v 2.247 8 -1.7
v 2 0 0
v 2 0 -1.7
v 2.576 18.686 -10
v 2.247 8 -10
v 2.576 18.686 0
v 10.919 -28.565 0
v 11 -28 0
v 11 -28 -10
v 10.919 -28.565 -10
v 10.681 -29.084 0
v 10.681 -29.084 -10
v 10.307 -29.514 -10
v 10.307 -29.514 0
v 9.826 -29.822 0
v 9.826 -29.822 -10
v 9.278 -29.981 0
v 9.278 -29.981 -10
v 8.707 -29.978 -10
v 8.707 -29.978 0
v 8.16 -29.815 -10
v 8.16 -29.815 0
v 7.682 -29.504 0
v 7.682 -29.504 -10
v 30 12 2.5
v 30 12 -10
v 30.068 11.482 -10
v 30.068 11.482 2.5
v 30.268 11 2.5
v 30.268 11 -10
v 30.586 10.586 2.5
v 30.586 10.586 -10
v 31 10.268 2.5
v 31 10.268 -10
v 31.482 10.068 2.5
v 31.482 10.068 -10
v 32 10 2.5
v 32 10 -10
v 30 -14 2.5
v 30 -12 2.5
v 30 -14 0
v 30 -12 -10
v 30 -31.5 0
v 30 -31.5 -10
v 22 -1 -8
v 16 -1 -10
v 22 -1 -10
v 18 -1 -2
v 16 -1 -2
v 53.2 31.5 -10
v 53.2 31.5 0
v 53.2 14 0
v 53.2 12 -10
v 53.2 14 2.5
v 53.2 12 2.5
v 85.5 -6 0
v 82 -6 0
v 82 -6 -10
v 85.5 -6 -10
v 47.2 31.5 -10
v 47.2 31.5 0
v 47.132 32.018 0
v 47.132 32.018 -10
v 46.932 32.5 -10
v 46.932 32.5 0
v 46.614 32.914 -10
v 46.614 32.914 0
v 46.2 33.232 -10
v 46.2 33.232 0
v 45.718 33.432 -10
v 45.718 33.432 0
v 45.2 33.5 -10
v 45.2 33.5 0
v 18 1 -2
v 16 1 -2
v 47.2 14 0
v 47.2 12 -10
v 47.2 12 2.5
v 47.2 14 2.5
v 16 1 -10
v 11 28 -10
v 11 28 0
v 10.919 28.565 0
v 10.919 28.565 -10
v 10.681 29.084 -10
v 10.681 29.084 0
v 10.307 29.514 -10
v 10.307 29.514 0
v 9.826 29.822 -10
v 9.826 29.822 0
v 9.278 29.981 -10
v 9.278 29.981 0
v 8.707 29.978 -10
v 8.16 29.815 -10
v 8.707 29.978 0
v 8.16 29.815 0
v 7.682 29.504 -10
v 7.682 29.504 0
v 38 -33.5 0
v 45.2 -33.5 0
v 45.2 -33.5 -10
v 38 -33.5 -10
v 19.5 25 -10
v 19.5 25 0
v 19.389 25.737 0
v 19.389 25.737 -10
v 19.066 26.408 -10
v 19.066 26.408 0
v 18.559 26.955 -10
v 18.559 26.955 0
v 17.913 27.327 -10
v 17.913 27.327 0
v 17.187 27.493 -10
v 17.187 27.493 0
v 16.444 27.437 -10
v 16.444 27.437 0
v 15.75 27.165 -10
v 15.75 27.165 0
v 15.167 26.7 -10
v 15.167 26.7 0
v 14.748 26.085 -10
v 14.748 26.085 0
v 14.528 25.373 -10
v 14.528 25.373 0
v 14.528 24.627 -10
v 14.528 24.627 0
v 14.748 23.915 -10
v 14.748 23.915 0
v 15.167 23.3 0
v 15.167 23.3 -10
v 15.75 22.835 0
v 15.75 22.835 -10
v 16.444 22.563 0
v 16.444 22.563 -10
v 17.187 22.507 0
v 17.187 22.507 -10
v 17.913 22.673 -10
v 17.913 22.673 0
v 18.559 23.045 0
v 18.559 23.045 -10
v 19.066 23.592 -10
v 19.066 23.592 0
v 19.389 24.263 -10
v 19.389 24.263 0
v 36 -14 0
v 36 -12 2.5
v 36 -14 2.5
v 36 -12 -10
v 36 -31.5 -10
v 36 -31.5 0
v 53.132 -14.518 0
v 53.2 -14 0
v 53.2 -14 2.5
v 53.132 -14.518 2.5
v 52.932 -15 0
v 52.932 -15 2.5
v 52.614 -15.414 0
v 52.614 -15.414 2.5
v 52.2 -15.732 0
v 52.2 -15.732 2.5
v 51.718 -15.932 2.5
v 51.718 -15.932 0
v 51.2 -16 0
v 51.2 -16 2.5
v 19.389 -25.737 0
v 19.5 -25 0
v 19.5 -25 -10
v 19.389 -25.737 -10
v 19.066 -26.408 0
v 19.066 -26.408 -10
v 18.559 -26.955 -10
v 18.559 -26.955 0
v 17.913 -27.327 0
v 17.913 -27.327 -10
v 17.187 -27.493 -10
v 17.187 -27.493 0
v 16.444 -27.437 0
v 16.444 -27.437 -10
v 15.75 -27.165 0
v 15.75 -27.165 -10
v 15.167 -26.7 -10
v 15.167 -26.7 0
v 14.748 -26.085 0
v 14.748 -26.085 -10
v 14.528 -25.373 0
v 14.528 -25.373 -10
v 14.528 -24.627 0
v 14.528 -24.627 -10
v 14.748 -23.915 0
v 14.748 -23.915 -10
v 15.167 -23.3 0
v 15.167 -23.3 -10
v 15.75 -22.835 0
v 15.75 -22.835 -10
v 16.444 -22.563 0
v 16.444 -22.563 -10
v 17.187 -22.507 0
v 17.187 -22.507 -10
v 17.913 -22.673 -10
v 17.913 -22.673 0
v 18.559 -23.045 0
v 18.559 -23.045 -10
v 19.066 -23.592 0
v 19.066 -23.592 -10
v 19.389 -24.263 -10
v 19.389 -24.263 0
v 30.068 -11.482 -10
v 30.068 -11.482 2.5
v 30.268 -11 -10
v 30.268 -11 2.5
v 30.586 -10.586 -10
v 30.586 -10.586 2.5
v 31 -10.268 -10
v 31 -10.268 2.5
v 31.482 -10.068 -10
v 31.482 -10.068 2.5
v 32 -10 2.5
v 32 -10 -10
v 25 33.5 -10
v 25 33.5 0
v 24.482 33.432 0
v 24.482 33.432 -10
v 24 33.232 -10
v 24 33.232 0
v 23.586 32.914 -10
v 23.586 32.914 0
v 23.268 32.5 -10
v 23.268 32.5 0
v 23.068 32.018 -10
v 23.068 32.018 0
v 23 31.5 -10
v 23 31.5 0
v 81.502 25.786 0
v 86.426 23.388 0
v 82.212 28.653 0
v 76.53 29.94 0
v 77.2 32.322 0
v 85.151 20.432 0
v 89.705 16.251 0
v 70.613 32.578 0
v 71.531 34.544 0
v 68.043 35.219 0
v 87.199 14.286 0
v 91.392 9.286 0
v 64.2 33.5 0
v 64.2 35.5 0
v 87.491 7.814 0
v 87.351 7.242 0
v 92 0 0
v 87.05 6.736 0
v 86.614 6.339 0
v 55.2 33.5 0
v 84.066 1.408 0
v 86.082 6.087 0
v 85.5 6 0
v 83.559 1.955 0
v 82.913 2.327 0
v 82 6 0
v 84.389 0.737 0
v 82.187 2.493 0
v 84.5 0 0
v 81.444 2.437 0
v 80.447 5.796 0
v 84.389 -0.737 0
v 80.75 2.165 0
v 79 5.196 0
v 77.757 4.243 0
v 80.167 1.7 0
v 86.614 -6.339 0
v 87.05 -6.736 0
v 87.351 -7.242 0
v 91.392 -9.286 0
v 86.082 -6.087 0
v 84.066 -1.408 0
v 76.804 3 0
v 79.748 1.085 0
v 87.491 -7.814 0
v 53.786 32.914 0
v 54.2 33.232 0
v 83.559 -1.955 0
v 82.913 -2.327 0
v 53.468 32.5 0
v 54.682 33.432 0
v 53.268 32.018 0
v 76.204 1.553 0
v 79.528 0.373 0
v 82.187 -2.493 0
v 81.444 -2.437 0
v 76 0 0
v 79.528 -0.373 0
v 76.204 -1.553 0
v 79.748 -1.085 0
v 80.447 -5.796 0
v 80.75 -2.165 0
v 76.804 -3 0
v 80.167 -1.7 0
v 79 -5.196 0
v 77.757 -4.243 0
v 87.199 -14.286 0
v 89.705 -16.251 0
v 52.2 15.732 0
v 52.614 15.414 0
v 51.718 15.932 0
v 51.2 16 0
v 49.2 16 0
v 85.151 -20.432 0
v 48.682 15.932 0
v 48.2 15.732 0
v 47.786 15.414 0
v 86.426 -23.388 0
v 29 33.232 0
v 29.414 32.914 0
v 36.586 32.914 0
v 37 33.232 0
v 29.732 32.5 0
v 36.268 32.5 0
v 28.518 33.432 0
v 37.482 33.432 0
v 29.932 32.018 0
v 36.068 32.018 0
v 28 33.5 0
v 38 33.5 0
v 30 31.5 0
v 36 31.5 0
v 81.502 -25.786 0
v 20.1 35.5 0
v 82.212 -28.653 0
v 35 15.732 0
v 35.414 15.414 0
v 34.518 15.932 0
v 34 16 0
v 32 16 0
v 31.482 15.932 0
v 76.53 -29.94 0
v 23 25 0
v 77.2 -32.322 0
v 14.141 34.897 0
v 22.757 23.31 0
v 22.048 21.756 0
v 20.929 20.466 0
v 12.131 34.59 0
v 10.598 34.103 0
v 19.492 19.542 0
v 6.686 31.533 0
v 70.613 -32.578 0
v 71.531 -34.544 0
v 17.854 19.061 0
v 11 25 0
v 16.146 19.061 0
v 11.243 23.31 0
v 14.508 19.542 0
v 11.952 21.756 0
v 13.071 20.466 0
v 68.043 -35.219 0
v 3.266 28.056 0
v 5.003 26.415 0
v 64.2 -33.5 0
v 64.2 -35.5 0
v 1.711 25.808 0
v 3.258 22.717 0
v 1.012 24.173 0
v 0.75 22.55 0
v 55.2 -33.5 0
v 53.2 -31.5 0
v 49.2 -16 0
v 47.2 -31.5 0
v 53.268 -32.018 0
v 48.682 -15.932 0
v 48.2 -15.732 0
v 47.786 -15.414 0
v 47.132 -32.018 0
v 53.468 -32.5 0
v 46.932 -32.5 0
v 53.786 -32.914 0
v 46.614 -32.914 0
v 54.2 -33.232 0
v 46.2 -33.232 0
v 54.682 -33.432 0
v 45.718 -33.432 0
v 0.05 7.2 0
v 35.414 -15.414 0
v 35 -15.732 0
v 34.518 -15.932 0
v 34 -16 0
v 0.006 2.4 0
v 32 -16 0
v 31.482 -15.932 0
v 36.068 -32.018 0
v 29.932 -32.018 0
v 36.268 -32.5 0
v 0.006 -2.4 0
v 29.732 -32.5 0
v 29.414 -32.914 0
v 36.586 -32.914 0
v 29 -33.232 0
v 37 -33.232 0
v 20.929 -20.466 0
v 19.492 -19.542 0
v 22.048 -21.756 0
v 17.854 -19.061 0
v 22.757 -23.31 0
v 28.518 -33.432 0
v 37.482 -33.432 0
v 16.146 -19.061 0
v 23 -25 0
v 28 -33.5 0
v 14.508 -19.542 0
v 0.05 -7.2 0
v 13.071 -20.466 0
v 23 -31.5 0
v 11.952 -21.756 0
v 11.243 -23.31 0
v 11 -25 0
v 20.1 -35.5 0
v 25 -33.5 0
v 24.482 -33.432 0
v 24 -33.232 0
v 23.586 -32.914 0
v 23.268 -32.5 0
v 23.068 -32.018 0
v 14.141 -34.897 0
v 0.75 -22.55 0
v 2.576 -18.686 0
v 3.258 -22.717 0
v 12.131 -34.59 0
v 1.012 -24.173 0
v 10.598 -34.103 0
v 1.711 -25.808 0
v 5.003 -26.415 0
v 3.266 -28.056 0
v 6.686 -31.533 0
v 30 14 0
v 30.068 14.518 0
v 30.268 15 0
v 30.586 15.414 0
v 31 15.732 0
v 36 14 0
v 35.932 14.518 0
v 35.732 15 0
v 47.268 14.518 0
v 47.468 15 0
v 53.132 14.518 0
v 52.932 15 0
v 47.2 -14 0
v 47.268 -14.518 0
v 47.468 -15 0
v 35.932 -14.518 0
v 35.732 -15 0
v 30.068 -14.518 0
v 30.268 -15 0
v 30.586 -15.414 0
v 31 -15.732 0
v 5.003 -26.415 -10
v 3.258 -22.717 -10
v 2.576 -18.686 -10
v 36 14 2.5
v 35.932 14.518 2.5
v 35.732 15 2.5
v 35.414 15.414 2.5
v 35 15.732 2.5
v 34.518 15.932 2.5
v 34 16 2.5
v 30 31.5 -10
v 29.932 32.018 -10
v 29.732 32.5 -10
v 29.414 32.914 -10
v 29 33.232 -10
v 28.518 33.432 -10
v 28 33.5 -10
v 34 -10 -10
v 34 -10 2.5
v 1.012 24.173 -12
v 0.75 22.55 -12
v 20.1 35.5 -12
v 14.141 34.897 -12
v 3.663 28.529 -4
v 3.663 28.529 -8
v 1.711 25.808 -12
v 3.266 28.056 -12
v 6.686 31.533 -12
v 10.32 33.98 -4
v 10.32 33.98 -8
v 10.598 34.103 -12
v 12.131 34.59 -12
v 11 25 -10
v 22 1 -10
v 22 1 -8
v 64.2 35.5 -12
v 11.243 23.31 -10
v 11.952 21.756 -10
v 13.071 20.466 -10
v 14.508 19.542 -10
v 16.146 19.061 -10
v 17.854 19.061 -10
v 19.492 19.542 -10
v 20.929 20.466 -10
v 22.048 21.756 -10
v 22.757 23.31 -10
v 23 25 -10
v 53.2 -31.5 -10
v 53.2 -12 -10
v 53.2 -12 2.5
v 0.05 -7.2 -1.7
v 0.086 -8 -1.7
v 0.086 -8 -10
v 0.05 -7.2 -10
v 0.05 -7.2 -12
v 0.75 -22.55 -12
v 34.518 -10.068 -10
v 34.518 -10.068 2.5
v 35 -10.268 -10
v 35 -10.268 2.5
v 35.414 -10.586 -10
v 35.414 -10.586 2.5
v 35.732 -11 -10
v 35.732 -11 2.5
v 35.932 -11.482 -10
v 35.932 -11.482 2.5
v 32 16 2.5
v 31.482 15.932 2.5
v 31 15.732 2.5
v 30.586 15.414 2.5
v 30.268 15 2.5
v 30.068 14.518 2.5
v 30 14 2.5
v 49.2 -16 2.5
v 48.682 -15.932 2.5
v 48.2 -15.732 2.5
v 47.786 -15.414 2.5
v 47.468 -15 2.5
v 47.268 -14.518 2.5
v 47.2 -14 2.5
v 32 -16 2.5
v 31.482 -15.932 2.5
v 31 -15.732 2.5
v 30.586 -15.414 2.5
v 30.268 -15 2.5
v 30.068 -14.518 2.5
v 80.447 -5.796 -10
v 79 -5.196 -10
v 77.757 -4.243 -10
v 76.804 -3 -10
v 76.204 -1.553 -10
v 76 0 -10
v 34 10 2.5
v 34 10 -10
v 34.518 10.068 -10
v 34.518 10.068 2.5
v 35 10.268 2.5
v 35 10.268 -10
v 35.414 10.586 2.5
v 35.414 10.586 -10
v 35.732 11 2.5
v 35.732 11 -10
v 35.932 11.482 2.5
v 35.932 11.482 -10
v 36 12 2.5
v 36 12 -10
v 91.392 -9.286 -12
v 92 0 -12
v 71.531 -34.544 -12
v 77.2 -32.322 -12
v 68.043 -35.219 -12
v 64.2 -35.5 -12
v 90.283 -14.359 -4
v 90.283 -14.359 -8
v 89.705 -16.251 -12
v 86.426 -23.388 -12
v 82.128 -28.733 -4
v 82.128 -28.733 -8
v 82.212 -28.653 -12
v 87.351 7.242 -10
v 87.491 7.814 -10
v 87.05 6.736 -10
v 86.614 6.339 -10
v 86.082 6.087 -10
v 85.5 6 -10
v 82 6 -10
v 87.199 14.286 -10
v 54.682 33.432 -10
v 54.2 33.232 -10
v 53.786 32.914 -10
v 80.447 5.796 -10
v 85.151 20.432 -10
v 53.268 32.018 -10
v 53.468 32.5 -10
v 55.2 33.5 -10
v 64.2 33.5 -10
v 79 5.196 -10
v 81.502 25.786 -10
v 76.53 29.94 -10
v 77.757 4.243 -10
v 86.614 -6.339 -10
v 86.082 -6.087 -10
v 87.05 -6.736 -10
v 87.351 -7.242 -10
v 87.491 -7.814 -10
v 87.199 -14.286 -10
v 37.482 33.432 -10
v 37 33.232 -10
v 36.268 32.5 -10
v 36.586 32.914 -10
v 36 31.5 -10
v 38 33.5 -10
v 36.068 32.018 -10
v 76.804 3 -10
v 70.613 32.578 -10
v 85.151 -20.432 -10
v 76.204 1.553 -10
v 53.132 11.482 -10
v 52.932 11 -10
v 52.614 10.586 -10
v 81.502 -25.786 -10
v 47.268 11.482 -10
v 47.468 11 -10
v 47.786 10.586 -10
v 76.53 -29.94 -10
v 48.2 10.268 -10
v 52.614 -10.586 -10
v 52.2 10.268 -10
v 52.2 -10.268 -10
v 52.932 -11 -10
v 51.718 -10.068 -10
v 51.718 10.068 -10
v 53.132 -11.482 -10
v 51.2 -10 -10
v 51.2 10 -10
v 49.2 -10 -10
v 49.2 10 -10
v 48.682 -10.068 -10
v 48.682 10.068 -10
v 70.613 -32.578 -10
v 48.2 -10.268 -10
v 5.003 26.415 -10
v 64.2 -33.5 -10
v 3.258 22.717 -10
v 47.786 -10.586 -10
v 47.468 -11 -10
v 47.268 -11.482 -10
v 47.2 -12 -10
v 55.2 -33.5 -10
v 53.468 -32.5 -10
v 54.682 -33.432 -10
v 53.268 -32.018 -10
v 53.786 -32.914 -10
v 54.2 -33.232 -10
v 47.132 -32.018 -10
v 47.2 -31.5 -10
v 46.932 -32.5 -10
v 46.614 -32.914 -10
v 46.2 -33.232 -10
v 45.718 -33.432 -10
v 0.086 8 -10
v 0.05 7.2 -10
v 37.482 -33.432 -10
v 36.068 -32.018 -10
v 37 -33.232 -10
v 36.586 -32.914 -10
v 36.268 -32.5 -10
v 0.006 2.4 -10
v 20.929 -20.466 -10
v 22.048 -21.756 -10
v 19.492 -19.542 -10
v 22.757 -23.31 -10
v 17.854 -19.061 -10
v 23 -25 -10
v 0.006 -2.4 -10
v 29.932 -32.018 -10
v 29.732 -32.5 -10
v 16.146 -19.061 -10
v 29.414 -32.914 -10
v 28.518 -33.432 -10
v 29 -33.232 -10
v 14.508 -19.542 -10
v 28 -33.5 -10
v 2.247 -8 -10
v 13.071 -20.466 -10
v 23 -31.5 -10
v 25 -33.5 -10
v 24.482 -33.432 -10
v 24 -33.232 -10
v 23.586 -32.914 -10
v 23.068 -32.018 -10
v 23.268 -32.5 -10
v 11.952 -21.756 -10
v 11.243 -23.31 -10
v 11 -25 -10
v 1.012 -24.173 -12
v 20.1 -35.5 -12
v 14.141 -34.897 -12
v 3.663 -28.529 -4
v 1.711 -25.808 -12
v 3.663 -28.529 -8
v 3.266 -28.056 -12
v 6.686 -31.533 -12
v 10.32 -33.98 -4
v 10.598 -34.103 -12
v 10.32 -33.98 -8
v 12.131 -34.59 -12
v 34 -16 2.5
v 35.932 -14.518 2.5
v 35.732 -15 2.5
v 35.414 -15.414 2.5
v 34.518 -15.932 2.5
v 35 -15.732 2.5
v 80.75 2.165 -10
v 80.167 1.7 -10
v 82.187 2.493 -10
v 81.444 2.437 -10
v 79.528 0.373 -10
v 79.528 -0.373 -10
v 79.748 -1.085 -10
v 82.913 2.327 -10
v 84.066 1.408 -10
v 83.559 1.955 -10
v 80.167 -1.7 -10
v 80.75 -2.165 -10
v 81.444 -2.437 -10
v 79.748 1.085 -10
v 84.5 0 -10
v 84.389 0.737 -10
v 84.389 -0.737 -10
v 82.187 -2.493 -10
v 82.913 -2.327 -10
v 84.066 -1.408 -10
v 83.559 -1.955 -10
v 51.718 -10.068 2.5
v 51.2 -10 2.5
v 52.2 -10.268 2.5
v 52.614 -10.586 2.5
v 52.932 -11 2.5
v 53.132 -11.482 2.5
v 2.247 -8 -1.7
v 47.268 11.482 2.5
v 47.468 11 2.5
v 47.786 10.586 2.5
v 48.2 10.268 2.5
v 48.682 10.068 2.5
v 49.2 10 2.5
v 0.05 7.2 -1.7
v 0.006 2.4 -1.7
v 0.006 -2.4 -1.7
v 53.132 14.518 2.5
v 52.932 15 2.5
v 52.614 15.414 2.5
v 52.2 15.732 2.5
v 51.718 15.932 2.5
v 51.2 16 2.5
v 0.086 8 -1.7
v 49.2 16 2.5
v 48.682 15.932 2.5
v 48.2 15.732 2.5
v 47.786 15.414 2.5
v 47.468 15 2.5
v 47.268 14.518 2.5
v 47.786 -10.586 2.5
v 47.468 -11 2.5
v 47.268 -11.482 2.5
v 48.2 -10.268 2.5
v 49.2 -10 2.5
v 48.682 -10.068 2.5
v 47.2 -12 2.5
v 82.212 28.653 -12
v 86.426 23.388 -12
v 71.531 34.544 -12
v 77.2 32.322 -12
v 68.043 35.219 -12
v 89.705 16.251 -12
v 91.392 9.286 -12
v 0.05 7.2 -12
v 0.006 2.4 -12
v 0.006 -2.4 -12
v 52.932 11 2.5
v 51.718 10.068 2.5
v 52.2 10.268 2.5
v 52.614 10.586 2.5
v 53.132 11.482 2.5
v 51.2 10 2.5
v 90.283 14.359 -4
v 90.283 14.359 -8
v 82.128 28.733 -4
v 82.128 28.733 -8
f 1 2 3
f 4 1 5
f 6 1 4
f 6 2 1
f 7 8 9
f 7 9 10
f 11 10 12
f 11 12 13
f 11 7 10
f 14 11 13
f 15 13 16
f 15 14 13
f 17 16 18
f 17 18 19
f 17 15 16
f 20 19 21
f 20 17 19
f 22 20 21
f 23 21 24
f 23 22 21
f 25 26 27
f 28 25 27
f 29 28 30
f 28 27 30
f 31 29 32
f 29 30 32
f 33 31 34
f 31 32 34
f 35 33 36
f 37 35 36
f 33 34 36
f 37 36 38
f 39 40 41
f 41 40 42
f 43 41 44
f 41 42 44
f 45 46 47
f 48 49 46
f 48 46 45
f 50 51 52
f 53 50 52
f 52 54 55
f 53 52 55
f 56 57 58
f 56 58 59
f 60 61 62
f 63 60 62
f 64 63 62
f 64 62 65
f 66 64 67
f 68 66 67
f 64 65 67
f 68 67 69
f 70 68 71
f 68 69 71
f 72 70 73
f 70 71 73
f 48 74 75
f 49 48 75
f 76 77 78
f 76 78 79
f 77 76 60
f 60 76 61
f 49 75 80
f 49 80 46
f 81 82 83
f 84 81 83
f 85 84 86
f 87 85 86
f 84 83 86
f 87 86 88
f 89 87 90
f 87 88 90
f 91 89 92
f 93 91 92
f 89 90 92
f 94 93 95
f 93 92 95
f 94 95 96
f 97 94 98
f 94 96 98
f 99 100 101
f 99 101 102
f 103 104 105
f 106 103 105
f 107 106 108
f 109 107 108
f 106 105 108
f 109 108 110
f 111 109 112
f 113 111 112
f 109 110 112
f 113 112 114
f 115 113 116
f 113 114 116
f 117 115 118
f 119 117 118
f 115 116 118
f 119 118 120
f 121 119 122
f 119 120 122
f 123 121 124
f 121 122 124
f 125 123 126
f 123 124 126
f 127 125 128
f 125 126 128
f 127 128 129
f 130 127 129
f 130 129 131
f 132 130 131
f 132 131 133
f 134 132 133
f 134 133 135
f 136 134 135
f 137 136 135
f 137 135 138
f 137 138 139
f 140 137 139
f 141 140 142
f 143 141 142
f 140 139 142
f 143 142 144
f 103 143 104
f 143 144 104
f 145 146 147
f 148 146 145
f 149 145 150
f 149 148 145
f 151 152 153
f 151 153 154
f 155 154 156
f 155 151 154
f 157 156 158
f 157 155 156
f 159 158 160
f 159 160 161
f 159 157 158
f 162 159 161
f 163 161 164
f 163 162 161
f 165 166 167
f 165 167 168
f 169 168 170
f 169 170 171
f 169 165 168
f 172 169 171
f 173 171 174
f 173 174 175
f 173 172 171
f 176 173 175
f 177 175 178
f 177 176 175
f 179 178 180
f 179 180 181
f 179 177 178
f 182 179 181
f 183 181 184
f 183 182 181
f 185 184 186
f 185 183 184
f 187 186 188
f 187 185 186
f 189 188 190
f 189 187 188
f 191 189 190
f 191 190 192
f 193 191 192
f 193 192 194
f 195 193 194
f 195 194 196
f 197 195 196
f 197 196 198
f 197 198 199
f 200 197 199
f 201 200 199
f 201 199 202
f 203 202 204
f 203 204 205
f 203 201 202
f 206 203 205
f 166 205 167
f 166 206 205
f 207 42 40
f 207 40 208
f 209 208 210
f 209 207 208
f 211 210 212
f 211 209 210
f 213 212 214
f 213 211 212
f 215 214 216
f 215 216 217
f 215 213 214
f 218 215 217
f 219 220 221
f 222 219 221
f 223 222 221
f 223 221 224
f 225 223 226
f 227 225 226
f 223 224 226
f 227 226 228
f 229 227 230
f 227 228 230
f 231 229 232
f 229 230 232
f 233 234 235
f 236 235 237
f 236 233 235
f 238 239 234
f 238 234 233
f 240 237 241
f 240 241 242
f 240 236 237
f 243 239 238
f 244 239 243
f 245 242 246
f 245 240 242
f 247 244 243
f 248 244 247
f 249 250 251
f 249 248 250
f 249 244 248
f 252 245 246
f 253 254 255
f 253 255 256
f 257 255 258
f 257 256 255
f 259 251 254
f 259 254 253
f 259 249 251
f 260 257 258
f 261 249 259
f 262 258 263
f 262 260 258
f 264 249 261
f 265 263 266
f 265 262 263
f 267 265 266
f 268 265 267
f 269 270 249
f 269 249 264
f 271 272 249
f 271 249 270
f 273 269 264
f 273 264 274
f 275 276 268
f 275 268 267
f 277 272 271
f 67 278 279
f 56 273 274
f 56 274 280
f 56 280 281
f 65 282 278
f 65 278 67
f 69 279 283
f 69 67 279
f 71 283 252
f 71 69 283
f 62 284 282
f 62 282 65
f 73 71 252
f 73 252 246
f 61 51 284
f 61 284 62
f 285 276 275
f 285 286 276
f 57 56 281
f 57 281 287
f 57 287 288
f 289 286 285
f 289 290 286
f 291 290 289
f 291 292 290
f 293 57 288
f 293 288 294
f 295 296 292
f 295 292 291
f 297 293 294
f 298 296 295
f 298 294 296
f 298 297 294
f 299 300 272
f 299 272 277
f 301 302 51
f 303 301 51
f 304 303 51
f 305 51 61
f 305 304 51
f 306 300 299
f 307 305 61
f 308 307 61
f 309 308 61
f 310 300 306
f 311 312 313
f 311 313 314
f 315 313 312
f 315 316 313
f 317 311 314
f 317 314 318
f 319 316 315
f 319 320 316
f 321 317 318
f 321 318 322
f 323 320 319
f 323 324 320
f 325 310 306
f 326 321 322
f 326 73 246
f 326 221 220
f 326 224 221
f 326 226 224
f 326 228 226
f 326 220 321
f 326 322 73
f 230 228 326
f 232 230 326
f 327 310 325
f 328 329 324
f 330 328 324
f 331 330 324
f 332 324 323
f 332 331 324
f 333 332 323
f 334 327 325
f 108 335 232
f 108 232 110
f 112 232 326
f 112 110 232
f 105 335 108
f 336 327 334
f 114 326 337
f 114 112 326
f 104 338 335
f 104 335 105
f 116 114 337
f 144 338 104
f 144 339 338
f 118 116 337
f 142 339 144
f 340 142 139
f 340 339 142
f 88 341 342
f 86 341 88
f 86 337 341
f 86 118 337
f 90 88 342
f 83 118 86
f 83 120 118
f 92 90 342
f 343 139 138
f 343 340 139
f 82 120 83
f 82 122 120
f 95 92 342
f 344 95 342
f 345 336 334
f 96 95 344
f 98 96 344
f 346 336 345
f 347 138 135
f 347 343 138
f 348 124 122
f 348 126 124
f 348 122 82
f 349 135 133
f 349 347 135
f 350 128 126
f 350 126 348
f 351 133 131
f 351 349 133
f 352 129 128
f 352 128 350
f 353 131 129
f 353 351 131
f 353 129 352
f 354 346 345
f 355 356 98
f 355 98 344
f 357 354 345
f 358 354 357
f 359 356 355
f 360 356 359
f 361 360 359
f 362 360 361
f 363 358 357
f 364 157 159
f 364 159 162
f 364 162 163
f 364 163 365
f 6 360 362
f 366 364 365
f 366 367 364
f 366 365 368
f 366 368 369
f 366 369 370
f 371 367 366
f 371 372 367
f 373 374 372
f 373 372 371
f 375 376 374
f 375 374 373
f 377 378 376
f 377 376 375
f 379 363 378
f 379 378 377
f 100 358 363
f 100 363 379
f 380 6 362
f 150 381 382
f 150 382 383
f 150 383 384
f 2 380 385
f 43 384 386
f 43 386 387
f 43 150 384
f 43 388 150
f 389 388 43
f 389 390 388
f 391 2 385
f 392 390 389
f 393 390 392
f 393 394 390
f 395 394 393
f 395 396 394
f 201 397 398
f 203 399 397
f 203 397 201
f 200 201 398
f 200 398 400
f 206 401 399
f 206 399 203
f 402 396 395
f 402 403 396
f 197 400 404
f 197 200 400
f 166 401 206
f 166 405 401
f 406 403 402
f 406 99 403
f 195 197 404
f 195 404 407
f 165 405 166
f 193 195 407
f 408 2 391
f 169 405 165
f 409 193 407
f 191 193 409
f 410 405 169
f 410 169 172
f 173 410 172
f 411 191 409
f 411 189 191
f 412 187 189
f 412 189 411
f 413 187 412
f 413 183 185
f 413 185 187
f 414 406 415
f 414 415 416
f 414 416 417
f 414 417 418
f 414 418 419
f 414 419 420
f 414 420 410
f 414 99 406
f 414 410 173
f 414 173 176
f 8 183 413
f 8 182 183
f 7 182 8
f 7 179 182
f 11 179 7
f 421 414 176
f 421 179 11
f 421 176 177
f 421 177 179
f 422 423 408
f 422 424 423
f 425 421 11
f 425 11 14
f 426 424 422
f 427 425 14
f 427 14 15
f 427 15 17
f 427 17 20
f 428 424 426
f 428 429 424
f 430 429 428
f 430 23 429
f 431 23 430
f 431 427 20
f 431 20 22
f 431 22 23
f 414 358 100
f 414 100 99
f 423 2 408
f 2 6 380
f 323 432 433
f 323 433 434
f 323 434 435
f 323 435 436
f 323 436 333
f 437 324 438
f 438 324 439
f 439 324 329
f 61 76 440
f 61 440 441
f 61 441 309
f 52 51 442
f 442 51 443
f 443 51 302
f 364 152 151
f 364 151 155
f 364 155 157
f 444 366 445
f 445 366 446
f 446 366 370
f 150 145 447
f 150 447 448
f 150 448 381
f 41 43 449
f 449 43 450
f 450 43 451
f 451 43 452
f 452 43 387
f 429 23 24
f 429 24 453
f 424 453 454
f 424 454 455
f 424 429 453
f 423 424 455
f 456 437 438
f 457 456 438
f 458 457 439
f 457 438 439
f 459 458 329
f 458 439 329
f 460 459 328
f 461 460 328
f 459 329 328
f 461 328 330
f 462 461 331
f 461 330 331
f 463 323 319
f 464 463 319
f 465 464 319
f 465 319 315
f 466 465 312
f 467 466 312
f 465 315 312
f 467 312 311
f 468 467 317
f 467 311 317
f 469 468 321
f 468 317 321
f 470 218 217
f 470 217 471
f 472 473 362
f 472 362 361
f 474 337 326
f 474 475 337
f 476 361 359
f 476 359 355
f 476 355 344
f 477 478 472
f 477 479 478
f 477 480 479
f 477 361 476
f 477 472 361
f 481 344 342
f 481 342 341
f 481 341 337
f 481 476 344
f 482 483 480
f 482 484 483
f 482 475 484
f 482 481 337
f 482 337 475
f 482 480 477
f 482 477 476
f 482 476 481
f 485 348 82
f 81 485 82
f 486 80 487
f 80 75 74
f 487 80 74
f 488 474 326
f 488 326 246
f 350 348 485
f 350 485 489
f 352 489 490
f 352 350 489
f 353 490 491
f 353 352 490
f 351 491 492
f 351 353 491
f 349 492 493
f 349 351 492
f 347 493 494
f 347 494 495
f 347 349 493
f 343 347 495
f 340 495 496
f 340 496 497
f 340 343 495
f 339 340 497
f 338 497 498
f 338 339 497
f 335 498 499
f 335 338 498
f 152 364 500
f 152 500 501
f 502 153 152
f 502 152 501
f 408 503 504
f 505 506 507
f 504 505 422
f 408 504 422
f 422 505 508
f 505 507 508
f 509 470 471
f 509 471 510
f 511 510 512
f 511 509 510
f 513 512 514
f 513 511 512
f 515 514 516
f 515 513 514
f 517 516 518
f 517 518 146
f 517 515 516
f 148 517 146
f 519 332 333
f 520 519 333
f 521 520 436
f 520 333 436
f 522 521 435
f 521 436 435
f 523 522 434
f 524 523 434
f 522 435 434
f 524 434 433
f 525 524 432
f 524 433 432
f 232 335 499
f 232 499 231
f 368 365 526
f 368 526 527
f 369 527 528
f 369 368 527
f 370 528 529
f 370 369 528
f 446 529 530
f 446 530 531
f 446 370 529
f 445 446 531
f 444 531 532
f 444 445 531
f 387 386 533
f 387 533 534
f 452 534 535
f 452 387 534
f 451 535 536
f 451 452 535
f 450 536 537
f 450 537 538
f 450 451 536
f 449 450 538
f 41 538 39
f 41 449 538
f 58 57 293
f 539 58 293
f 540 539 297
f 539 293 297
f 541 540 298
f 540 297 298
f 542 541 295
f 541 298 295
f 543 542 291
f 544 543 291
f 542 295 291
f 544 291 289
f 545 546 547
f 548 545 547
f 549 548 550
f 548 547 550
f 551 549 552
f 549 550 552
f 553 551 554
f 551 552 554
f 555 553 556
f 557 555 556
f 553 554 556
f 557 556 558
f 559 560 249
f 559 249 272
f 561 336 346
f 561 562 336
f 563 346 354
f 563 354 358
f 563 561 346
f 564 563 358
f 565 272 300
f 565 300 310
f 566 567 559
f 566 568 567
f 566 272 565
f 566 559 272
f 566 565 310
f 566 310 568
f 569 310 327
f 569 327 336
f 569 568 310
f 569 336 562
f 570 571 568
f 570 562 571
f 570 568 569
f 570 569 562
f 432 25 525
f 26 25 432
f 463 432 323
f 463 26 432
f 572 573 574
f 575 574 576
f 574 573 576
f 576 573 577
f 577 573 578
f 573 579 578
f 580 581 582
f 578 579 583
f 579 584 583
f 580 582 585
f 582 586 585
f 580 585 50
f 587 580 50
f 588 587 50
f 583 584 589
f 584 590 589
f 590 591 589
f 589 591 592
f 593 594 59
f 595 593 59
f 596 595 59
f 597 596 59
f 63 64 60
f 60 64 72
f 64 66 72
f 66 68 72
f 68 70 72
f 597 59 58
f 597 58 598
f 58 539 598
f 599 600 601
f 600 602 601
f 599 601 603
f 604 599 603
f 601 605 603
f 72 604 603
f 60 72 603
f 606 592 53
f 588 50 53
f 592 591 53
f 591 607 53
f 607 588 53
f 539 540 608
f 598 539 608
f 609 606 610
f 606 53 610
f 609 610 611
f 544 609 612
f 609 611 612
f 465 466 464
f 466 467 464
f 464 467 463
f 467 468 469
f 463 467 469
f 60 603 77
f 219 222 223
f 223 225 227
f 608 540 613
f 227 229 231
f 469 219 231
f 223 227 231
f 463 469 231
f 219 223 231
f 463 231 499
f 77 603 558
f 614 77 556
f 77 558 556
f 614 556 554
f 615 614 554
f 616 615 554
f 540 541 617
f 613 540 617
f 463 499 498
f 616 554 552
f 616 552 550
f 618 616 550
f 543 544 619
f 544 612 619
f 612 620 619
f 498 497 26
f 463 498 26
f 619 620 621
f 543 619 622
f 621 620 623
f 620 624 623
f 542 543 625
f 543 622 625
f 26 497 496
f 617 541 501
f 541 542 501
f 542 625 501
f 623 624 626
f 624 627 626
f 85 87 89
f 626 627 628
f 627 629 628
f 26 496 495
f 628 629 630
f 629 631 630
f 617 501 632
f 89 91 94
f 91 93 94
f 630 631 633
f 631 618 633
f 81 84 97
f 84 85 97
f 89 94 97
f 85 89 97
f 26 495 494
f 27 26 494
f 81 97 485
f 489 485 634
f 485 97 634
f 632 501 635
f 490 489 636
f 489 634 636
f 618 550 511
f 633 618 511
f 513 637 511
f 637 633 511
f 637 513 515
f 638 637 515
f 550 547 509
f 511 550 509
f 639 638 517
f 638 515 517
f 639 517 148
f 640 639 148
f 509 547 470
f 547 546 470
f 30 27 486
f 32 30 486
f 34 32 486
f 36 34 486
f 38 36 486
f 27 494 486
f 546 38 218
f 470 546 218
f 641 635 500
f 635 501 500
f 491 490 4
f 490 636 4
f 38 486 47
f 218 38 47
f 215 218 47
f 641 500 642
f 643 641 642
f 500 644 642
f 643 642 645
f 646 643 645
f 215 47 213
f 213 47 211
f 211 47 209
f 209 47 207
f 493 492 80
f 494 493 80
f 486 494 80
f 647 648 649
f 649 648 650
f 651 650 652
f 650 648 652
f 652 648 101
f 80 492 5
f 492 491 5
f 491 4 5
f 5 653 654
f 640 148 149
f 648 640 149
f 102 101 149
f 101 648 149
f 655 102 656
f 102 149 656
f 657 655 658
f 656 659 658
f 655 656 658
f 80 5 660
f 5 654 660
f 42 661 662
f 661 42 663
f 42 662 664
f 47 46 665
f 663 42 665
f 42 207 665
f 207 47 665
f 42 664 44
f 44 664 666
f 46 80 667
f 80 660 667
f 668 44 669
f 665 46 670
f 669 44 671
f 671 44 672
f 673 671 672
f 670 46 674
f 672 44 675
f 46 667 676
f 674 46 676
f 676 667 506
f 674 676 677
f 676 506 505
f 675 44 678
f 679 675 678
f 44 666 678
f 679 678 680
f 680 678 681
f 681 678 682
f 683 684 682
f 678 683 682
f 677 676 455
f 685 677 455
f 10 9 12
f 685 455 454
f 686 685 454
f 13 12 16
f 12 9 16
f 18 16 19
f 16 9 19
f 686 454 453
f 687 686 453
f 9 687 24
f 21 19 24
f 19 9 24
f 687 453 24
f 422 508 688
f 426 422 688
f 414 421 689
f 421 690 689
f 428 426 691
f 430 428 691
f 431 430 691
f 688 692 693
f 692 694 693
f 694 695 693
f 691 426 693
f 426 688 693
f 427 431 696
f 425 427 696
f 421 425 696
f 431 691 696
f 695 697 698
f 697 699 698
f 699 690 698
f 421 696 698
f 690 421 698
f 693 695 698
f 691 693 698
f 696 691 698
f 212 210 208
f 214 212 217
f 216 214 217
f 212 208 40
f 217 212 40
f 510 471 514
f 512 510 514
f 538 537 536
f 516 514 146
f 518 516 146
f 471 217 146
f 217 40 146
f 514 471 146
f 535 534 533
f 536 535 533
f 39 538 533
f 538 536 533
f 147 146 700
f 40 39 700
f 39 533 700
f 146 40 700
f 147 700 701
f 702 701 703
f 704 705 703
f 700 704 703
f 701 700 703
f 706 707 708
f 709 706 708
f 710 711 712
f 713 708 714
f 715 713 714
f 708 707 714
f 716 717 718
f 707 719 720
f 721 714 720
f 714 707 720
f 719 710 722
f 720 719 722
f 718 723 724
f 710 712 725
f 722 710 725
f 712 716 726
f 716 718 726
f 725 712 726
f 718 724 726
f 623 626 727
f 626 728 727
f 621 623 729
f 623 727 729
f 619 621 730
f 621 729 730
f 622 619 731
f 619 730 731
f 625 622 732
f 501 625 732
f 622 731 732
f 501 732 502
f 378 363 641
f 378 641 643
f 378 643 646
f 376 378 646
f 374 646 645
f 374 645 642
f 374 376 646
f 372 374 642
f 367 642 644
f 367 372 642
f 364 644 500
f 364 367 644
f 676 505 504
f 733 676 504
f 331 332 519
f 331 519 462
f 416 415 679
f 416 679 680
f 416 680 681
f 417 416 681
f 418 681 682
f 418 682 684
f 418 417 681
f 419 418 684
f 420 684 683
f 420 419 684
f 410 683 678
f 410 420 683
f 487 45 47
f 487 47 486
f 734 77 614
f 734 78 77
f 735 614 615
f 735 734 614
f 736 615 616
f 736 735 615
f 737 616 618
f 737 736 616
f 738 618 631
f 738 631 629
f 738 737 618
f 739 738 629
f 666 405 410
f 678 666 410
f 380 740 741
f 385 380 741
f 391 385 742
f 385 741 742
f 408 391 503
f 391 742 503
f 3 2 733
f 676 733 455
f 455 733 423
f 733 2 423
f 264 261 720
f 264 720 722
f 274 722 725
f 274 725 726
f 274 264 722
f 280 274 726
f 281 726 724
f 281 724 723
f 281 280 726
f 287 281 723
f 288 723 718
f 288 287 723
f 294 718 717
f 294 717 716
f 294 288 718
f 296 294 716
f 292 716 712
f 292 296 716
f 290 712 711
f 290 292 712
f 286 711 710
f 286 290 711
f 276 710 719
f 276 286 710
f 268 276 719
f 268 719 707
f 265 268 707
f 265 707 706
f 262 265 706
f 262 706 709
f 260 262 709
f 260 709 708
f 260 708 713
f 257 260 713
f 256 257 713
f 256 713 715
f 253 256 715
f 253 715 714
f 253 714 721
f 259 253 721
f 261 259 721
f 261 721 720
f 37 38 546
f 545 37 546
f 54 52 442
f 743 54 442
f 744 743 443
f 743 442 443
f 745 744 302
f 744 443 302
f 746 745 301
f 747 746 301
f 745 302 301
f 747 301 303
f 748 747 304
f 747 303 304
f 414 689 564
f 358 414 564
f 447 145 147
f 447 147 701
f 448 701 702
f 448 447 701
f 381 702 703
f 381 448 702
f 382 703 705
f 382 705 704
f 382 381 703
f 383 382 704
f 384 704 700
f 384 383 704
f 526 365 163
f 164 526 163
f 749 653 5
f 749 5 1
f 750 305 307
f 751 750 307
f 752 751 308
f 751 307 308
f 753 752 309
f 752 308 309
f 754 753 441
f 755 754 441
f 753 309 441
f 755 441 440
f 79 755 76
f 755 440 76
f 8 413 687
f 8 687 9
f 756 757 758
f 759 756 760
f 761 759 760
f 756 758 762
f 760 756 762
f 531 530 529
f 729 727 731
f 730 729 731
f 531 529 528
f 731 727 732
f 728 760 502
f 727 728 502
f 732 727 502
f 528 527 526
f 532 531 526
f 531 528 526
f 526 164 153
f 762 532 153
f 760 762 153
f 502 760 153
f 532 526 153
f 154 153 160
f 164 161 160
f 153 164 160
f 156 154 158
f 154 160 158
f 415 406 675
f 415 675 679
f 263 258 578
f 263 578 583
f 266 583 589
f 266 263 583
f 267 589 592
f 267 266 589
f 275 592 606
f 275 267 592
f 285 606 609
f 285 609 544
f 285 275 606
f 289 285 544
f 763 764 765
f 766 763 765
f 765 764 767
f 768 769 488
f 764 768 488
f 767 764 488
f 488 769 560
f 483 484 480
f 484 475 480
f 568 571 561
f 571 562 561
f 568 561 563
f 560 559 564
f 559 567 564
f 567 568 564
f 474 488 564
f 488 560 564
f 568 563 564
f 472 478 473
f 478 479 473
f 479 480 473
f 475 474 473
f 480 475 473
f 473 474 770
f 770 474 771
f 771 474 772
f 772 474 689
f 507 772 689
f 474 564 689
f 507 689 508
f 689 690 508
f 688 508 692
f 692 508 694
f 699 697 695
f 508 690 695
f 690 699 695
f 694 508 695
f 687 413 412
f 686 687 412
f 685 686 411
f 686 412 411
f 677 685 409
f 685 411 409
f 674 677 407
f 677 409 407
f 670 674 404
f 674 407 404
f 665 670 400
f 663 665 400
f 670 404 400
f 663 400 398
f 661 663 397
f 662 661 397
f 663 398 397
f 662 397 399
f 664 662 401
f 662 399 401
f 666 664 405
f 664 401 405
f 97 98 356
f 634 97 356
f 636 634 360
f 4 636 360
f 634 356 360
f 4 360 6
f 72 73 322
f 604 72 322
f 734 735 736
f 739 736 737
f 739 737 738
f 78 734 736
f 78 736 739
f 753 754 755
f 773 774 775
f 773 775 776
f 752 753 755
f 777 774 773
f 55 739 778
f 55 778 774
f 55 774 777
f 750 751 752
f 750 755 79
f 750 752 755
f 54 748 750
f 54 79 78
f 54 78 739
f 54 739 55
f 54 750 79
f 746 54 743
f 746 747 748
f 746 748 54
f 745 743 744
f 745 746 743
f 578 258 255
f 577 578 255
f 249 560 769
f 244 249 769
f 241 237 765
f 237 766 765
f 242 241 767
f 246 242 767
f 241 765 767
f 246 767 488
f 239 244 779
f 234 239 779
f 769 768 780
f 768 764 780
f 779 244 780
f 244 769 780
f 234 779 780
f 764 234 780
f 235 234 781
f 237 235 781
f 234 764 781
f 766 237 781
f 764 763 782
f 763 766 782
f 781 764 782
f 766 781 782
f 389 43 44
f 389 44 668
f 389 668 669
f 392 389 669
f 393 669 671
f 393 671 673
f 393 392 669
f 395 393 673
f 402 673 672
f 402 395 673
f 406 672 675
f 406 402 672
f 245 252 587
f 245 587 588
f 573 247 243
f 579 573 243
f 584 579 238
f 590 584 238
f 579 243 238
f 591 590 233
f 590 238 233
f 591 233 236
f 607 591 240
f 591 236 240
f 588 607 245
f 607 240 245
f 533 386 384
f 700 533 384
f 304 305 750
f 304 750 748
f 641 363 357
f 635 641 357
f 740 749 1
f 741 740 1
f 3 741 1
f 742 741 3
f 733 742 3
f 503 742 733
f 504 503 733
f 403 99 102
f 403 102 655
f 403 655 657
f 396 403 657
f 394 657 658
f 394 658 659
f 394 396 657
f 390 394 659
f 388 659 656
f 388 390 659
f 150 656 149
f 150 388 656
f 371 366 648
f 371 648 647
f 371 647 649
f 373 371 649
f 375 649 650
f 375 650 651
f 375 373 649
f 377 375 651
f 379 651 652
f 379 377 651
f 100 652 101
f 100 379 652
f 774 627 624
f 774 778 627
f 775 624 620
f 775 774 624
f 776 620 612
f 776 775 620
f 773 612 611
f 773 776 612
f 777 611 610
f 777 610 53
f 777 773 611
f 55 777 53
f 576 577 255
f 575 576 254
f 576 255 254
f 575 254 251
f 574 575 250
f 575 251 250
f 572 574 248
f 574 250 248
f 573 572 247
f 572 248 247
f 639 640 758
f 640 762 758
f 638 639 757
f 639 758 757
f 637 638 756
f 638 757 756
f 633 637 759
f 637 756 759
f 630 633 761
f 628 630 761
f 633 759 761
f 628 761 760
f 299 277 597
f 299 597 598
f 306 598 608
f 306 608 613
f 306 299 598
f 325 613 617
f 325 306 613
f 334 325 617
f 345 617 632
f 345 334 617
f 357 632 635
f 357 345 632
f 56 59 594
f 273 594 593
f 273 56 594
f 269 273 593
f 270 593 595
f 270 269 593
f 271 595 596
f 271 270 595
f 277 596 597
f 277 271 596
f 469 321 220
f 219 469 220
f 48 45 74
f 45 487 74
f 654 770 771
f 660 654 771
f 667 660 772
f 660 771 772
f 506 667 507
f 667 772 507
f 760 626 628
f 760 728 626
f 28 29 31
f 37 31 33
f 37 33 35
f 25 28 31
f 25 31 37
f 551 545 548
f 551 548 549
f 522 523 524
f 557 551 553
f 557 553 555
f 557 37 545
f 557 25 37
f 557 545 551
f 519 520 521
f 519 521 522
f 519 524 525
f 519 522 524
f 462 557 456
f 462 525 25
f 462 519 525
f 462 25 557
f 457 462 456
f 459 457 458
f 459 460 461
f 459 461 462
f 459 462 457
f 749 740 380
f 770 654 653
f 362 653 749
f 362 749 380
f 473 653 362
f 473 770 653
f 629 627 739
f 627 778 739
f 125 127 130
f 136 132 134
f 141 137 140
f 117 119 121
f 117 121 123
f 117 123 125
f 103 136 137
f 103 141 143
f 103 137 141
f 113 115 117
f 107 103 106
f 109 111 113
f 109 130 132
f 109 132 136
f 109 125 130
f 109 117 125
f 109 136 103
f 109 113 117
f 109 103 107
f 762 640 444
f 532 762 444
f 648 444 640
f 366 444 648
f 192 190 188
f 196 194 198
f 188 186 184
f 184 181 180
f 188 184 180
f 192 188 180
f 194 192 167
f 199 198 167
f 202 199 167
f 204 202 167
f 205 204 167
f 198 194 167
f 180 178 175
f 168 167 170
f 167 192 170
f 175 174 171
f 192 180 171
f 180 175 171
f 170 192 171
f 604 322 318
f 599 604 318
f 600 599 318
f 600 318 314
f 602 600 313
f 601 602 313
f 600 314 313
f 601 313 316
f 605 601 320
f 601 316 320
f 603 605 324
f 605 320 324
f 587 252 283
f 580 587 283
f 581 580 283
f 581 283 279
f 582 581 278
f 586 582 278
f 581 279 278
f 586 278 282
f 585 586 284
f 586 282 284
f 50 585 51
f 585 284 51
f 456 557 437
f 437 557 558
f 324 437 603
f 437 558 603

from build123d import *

# Parameters (mm, degrees)
PAD002_DEPTH    = 12
SKETCH017_R     = 2.5
POCKET014_DEPTH = 10
POCKET015_DEPTH = 1
SKETCH019_W     = 8
SKETCH019_H     = 8.3
POCKET016_DEPTH = 5
PAD003_DEPTH    = 2.5


with BuildPart() as part:
    # Sketch016 → Pad002 (new body)
    with BuildSketch(Plane.XY):
        with BuildLine():
            ThreePointArc((0, 0), (0.0125001507, 3.6000868045), (0.05, 7.2))
            Line((0.05, 7.2), (0.75, 22.55))
            add(Edge.make_bspline(
                [(0.75, 22.55), (0.790433, 24.50555), (2.8995135699, 28.3383927733), (10.6468681476, 35.231617337), (14.5053016695, 34.8194742751), (20.1, 35.5)],
                knots=[0, 0, 0, 0, 0.3333333333, 0.6666666667, 1, 1, 1, 1], degree=3))
            Line((20.1, 35.5), (64.2, 35.5))
            add(Edge.make_bspline(
                [(92, 0), (92.391037, 11.810127), (88.126587, 35.076866), (64.2, 35.5)],
                knots=[0, 0, 0, 0, 1, 1, 1, 1], degree=3))
            Line((92, 0), (0, 0))
        make_face()
    extrude(amount=PAD002_DEPTH)

    # Sketch017 (on Face8 of Pad002) → Pocket014 (cut)
    with BuildSketch(Plane.XY.offset(12)):
        with Locations((17, 25)):
            Circle(SKETCH017_R)
        with BuildLine():
            ThreePointArc((84.5, 0), (82, 2.5), (79.5, 0))
            Line((79.5, 0), (84.5, 0))
        make_face()
        with BuildLine():
            Line((2, 0), (2.5758571429, 18.6857169977))
            ThreePointArc((7.6817324497, 29.5040514173), (4.0036624605, 24.625907301), (2.5758571429, 18.6857169977))
            ThreePointArc((11, 28), (9.8256709089, 29.8216112511), (7.6817324497, 29.5040514173))
            Line((11, 25), (11, 28))
            ThreePointArc((11, 25), (17, 19), (23, 25))
            Line((23, 25), (23, 31.5))
            ThreePointArc((25, 33.5), (23.5857864376, 32.9142135624), (23, 31.5))
            Line((28, 33.5), (25, 33.5))
            ThreePointArc((30, 31.5), (29.4142135624, 32.9142135624), (28, 33.5))
            Line((30, 12), (30, 31.5))
            ThreePointArc((30, 12), (30.5857864376, 10.5857864376), (32, 10))
            Line((34, 10), (32, 10))
            ThreePointArc((34, 10), (35.4142135624, 10.5857864376), (36, 12))
            Line((36, 31.5), (36, 12))
            ThreePointArc((38, 33.5), (36.5857864376, 32.9142135624), (36, 31.5))
            Line((45.2, 33.5), (38, 33.5))
            ThreePointArc((47.2, 31.5), (46.6142135624, 32.9142135624), (45.2, 33.5))
            Line((47.2, 12), (47.2, 31.5))
            ThreePointArc((47.2, 12), (47.7857864376, 10.5857864376), (49.2, 10))
            Line((51.2, 10), (49.2, 10))
            ThreePointArc((51.2, 10), (52.6142135624, 10.5857864376), (53.2, 12))
            Line((53.2, 31.4999999999), (53.2, 12))
            ThreePointArc((55.2, 33.4999999999), (53.7857864376, 32.9142135623), (53.2, 31.4999999999))
            Line((55.2, 33.5), (64.2, 33.5))
            ThreePointArc((87.491325765, 7.8139309331), (81.5019467421, 25.7859071373), (64.2, 33.5))
            ThreePointArc((85.5, 6), (86.8468225322, 6.521463877), (87.491325765, 7.8139309331))
            Line((82, 6), (85.5, 6))
            ThreePointArc((82, 6), (77.7573593129, 4.2426406871), (76, 0))
            Line((22, 0), (76, 0))
            Line((22, 1), (22, 0))
            Line((16, 1), (22, 1))
            Line((16, 0), (16, 1))
            Line((2, 0), (16, 0))
        make_face()
    extrude(amount=-POCKET014_DEPTH, mode=Mode.SUBTRACT)

    # Sketch018 (on Face3 of Pocket014) → Pocket015 (cut)
    with BuildSketch(Plane.XZ):
        Polygon((22, 12), (22, 4), (18, 10), (16, 10), (16, 12), align=None)
    extrude(amount=-POCKET015_DEPTH, mode=Mode.SUBTRACT)

    # Sketch019 → Pocket016 (cut)
    with BuildSketch(Plane.YZ):
        with Locations((4, 6.15)):
            Rectangle(SKETCH019_W, SKETCH019_H)
    extrude(amount=POCKET016_DEPTH, mode=Mode.SUBTRACT)

    # Sketch022 (on Face8 of Pocket016) → Pad003 (join)
    with BuildSketch(Plane.XY.offset(12)):
        with BuildLine():
            ThreePointArc((34, 10), (35.4142135624, 10.5857864376), (36, 12))
            Line((36, 12), (36, 14))
            ThreePointArc((36, 14), (35.4142135624, 15.4142135624), (34, 16))
            Line((32, 16), (34, 16))
            ThreePointArc((32, 16), (30.5857864376, 15.4142135624), (30, 14))
            Line((30, 12), (30, 14))
            ThreePointArc((30, 12), (30.5857864376, 10.5857864376), (32, 10))
            Line((32, 10), (34, 10))
        make_face()
        with BuildLine():
            ThreePointArc((47.2, 12), (47.7857864376, 10.5857864376), (49.2, 10))
            Line((49.2, 10), (51.2, 10))
            ThreePointArc((51.2, 10), (52.6142135624, 10.5857864376), (53.2, 12))
            Line((53.2, 12), (53.2, 14))
            ThreePointArc((53.2, 14), (52.6142135624, 15.4142135624), (51.2, 16))
            Line((49.2, 16), (51.2, 16))
            ThreePointArc((49.2, 16), (47.7857864376, 15.4142135624), (47.2, 14))
            Line((47.2, 12), (47.2, 14))
        make_face()
    extrude(amount=PAD003_DEPTH)

    # Mirrored001: part across XZ


with BuildPart() as part_1:
    add(part.part)
    add(part.part.mirror(Plane.XZ))


with BuildPart() as part_2:
    # Body002 placement: moved
    add(part_1.part.moved(Location((0, 0, -12))))


solid = part_2.part
